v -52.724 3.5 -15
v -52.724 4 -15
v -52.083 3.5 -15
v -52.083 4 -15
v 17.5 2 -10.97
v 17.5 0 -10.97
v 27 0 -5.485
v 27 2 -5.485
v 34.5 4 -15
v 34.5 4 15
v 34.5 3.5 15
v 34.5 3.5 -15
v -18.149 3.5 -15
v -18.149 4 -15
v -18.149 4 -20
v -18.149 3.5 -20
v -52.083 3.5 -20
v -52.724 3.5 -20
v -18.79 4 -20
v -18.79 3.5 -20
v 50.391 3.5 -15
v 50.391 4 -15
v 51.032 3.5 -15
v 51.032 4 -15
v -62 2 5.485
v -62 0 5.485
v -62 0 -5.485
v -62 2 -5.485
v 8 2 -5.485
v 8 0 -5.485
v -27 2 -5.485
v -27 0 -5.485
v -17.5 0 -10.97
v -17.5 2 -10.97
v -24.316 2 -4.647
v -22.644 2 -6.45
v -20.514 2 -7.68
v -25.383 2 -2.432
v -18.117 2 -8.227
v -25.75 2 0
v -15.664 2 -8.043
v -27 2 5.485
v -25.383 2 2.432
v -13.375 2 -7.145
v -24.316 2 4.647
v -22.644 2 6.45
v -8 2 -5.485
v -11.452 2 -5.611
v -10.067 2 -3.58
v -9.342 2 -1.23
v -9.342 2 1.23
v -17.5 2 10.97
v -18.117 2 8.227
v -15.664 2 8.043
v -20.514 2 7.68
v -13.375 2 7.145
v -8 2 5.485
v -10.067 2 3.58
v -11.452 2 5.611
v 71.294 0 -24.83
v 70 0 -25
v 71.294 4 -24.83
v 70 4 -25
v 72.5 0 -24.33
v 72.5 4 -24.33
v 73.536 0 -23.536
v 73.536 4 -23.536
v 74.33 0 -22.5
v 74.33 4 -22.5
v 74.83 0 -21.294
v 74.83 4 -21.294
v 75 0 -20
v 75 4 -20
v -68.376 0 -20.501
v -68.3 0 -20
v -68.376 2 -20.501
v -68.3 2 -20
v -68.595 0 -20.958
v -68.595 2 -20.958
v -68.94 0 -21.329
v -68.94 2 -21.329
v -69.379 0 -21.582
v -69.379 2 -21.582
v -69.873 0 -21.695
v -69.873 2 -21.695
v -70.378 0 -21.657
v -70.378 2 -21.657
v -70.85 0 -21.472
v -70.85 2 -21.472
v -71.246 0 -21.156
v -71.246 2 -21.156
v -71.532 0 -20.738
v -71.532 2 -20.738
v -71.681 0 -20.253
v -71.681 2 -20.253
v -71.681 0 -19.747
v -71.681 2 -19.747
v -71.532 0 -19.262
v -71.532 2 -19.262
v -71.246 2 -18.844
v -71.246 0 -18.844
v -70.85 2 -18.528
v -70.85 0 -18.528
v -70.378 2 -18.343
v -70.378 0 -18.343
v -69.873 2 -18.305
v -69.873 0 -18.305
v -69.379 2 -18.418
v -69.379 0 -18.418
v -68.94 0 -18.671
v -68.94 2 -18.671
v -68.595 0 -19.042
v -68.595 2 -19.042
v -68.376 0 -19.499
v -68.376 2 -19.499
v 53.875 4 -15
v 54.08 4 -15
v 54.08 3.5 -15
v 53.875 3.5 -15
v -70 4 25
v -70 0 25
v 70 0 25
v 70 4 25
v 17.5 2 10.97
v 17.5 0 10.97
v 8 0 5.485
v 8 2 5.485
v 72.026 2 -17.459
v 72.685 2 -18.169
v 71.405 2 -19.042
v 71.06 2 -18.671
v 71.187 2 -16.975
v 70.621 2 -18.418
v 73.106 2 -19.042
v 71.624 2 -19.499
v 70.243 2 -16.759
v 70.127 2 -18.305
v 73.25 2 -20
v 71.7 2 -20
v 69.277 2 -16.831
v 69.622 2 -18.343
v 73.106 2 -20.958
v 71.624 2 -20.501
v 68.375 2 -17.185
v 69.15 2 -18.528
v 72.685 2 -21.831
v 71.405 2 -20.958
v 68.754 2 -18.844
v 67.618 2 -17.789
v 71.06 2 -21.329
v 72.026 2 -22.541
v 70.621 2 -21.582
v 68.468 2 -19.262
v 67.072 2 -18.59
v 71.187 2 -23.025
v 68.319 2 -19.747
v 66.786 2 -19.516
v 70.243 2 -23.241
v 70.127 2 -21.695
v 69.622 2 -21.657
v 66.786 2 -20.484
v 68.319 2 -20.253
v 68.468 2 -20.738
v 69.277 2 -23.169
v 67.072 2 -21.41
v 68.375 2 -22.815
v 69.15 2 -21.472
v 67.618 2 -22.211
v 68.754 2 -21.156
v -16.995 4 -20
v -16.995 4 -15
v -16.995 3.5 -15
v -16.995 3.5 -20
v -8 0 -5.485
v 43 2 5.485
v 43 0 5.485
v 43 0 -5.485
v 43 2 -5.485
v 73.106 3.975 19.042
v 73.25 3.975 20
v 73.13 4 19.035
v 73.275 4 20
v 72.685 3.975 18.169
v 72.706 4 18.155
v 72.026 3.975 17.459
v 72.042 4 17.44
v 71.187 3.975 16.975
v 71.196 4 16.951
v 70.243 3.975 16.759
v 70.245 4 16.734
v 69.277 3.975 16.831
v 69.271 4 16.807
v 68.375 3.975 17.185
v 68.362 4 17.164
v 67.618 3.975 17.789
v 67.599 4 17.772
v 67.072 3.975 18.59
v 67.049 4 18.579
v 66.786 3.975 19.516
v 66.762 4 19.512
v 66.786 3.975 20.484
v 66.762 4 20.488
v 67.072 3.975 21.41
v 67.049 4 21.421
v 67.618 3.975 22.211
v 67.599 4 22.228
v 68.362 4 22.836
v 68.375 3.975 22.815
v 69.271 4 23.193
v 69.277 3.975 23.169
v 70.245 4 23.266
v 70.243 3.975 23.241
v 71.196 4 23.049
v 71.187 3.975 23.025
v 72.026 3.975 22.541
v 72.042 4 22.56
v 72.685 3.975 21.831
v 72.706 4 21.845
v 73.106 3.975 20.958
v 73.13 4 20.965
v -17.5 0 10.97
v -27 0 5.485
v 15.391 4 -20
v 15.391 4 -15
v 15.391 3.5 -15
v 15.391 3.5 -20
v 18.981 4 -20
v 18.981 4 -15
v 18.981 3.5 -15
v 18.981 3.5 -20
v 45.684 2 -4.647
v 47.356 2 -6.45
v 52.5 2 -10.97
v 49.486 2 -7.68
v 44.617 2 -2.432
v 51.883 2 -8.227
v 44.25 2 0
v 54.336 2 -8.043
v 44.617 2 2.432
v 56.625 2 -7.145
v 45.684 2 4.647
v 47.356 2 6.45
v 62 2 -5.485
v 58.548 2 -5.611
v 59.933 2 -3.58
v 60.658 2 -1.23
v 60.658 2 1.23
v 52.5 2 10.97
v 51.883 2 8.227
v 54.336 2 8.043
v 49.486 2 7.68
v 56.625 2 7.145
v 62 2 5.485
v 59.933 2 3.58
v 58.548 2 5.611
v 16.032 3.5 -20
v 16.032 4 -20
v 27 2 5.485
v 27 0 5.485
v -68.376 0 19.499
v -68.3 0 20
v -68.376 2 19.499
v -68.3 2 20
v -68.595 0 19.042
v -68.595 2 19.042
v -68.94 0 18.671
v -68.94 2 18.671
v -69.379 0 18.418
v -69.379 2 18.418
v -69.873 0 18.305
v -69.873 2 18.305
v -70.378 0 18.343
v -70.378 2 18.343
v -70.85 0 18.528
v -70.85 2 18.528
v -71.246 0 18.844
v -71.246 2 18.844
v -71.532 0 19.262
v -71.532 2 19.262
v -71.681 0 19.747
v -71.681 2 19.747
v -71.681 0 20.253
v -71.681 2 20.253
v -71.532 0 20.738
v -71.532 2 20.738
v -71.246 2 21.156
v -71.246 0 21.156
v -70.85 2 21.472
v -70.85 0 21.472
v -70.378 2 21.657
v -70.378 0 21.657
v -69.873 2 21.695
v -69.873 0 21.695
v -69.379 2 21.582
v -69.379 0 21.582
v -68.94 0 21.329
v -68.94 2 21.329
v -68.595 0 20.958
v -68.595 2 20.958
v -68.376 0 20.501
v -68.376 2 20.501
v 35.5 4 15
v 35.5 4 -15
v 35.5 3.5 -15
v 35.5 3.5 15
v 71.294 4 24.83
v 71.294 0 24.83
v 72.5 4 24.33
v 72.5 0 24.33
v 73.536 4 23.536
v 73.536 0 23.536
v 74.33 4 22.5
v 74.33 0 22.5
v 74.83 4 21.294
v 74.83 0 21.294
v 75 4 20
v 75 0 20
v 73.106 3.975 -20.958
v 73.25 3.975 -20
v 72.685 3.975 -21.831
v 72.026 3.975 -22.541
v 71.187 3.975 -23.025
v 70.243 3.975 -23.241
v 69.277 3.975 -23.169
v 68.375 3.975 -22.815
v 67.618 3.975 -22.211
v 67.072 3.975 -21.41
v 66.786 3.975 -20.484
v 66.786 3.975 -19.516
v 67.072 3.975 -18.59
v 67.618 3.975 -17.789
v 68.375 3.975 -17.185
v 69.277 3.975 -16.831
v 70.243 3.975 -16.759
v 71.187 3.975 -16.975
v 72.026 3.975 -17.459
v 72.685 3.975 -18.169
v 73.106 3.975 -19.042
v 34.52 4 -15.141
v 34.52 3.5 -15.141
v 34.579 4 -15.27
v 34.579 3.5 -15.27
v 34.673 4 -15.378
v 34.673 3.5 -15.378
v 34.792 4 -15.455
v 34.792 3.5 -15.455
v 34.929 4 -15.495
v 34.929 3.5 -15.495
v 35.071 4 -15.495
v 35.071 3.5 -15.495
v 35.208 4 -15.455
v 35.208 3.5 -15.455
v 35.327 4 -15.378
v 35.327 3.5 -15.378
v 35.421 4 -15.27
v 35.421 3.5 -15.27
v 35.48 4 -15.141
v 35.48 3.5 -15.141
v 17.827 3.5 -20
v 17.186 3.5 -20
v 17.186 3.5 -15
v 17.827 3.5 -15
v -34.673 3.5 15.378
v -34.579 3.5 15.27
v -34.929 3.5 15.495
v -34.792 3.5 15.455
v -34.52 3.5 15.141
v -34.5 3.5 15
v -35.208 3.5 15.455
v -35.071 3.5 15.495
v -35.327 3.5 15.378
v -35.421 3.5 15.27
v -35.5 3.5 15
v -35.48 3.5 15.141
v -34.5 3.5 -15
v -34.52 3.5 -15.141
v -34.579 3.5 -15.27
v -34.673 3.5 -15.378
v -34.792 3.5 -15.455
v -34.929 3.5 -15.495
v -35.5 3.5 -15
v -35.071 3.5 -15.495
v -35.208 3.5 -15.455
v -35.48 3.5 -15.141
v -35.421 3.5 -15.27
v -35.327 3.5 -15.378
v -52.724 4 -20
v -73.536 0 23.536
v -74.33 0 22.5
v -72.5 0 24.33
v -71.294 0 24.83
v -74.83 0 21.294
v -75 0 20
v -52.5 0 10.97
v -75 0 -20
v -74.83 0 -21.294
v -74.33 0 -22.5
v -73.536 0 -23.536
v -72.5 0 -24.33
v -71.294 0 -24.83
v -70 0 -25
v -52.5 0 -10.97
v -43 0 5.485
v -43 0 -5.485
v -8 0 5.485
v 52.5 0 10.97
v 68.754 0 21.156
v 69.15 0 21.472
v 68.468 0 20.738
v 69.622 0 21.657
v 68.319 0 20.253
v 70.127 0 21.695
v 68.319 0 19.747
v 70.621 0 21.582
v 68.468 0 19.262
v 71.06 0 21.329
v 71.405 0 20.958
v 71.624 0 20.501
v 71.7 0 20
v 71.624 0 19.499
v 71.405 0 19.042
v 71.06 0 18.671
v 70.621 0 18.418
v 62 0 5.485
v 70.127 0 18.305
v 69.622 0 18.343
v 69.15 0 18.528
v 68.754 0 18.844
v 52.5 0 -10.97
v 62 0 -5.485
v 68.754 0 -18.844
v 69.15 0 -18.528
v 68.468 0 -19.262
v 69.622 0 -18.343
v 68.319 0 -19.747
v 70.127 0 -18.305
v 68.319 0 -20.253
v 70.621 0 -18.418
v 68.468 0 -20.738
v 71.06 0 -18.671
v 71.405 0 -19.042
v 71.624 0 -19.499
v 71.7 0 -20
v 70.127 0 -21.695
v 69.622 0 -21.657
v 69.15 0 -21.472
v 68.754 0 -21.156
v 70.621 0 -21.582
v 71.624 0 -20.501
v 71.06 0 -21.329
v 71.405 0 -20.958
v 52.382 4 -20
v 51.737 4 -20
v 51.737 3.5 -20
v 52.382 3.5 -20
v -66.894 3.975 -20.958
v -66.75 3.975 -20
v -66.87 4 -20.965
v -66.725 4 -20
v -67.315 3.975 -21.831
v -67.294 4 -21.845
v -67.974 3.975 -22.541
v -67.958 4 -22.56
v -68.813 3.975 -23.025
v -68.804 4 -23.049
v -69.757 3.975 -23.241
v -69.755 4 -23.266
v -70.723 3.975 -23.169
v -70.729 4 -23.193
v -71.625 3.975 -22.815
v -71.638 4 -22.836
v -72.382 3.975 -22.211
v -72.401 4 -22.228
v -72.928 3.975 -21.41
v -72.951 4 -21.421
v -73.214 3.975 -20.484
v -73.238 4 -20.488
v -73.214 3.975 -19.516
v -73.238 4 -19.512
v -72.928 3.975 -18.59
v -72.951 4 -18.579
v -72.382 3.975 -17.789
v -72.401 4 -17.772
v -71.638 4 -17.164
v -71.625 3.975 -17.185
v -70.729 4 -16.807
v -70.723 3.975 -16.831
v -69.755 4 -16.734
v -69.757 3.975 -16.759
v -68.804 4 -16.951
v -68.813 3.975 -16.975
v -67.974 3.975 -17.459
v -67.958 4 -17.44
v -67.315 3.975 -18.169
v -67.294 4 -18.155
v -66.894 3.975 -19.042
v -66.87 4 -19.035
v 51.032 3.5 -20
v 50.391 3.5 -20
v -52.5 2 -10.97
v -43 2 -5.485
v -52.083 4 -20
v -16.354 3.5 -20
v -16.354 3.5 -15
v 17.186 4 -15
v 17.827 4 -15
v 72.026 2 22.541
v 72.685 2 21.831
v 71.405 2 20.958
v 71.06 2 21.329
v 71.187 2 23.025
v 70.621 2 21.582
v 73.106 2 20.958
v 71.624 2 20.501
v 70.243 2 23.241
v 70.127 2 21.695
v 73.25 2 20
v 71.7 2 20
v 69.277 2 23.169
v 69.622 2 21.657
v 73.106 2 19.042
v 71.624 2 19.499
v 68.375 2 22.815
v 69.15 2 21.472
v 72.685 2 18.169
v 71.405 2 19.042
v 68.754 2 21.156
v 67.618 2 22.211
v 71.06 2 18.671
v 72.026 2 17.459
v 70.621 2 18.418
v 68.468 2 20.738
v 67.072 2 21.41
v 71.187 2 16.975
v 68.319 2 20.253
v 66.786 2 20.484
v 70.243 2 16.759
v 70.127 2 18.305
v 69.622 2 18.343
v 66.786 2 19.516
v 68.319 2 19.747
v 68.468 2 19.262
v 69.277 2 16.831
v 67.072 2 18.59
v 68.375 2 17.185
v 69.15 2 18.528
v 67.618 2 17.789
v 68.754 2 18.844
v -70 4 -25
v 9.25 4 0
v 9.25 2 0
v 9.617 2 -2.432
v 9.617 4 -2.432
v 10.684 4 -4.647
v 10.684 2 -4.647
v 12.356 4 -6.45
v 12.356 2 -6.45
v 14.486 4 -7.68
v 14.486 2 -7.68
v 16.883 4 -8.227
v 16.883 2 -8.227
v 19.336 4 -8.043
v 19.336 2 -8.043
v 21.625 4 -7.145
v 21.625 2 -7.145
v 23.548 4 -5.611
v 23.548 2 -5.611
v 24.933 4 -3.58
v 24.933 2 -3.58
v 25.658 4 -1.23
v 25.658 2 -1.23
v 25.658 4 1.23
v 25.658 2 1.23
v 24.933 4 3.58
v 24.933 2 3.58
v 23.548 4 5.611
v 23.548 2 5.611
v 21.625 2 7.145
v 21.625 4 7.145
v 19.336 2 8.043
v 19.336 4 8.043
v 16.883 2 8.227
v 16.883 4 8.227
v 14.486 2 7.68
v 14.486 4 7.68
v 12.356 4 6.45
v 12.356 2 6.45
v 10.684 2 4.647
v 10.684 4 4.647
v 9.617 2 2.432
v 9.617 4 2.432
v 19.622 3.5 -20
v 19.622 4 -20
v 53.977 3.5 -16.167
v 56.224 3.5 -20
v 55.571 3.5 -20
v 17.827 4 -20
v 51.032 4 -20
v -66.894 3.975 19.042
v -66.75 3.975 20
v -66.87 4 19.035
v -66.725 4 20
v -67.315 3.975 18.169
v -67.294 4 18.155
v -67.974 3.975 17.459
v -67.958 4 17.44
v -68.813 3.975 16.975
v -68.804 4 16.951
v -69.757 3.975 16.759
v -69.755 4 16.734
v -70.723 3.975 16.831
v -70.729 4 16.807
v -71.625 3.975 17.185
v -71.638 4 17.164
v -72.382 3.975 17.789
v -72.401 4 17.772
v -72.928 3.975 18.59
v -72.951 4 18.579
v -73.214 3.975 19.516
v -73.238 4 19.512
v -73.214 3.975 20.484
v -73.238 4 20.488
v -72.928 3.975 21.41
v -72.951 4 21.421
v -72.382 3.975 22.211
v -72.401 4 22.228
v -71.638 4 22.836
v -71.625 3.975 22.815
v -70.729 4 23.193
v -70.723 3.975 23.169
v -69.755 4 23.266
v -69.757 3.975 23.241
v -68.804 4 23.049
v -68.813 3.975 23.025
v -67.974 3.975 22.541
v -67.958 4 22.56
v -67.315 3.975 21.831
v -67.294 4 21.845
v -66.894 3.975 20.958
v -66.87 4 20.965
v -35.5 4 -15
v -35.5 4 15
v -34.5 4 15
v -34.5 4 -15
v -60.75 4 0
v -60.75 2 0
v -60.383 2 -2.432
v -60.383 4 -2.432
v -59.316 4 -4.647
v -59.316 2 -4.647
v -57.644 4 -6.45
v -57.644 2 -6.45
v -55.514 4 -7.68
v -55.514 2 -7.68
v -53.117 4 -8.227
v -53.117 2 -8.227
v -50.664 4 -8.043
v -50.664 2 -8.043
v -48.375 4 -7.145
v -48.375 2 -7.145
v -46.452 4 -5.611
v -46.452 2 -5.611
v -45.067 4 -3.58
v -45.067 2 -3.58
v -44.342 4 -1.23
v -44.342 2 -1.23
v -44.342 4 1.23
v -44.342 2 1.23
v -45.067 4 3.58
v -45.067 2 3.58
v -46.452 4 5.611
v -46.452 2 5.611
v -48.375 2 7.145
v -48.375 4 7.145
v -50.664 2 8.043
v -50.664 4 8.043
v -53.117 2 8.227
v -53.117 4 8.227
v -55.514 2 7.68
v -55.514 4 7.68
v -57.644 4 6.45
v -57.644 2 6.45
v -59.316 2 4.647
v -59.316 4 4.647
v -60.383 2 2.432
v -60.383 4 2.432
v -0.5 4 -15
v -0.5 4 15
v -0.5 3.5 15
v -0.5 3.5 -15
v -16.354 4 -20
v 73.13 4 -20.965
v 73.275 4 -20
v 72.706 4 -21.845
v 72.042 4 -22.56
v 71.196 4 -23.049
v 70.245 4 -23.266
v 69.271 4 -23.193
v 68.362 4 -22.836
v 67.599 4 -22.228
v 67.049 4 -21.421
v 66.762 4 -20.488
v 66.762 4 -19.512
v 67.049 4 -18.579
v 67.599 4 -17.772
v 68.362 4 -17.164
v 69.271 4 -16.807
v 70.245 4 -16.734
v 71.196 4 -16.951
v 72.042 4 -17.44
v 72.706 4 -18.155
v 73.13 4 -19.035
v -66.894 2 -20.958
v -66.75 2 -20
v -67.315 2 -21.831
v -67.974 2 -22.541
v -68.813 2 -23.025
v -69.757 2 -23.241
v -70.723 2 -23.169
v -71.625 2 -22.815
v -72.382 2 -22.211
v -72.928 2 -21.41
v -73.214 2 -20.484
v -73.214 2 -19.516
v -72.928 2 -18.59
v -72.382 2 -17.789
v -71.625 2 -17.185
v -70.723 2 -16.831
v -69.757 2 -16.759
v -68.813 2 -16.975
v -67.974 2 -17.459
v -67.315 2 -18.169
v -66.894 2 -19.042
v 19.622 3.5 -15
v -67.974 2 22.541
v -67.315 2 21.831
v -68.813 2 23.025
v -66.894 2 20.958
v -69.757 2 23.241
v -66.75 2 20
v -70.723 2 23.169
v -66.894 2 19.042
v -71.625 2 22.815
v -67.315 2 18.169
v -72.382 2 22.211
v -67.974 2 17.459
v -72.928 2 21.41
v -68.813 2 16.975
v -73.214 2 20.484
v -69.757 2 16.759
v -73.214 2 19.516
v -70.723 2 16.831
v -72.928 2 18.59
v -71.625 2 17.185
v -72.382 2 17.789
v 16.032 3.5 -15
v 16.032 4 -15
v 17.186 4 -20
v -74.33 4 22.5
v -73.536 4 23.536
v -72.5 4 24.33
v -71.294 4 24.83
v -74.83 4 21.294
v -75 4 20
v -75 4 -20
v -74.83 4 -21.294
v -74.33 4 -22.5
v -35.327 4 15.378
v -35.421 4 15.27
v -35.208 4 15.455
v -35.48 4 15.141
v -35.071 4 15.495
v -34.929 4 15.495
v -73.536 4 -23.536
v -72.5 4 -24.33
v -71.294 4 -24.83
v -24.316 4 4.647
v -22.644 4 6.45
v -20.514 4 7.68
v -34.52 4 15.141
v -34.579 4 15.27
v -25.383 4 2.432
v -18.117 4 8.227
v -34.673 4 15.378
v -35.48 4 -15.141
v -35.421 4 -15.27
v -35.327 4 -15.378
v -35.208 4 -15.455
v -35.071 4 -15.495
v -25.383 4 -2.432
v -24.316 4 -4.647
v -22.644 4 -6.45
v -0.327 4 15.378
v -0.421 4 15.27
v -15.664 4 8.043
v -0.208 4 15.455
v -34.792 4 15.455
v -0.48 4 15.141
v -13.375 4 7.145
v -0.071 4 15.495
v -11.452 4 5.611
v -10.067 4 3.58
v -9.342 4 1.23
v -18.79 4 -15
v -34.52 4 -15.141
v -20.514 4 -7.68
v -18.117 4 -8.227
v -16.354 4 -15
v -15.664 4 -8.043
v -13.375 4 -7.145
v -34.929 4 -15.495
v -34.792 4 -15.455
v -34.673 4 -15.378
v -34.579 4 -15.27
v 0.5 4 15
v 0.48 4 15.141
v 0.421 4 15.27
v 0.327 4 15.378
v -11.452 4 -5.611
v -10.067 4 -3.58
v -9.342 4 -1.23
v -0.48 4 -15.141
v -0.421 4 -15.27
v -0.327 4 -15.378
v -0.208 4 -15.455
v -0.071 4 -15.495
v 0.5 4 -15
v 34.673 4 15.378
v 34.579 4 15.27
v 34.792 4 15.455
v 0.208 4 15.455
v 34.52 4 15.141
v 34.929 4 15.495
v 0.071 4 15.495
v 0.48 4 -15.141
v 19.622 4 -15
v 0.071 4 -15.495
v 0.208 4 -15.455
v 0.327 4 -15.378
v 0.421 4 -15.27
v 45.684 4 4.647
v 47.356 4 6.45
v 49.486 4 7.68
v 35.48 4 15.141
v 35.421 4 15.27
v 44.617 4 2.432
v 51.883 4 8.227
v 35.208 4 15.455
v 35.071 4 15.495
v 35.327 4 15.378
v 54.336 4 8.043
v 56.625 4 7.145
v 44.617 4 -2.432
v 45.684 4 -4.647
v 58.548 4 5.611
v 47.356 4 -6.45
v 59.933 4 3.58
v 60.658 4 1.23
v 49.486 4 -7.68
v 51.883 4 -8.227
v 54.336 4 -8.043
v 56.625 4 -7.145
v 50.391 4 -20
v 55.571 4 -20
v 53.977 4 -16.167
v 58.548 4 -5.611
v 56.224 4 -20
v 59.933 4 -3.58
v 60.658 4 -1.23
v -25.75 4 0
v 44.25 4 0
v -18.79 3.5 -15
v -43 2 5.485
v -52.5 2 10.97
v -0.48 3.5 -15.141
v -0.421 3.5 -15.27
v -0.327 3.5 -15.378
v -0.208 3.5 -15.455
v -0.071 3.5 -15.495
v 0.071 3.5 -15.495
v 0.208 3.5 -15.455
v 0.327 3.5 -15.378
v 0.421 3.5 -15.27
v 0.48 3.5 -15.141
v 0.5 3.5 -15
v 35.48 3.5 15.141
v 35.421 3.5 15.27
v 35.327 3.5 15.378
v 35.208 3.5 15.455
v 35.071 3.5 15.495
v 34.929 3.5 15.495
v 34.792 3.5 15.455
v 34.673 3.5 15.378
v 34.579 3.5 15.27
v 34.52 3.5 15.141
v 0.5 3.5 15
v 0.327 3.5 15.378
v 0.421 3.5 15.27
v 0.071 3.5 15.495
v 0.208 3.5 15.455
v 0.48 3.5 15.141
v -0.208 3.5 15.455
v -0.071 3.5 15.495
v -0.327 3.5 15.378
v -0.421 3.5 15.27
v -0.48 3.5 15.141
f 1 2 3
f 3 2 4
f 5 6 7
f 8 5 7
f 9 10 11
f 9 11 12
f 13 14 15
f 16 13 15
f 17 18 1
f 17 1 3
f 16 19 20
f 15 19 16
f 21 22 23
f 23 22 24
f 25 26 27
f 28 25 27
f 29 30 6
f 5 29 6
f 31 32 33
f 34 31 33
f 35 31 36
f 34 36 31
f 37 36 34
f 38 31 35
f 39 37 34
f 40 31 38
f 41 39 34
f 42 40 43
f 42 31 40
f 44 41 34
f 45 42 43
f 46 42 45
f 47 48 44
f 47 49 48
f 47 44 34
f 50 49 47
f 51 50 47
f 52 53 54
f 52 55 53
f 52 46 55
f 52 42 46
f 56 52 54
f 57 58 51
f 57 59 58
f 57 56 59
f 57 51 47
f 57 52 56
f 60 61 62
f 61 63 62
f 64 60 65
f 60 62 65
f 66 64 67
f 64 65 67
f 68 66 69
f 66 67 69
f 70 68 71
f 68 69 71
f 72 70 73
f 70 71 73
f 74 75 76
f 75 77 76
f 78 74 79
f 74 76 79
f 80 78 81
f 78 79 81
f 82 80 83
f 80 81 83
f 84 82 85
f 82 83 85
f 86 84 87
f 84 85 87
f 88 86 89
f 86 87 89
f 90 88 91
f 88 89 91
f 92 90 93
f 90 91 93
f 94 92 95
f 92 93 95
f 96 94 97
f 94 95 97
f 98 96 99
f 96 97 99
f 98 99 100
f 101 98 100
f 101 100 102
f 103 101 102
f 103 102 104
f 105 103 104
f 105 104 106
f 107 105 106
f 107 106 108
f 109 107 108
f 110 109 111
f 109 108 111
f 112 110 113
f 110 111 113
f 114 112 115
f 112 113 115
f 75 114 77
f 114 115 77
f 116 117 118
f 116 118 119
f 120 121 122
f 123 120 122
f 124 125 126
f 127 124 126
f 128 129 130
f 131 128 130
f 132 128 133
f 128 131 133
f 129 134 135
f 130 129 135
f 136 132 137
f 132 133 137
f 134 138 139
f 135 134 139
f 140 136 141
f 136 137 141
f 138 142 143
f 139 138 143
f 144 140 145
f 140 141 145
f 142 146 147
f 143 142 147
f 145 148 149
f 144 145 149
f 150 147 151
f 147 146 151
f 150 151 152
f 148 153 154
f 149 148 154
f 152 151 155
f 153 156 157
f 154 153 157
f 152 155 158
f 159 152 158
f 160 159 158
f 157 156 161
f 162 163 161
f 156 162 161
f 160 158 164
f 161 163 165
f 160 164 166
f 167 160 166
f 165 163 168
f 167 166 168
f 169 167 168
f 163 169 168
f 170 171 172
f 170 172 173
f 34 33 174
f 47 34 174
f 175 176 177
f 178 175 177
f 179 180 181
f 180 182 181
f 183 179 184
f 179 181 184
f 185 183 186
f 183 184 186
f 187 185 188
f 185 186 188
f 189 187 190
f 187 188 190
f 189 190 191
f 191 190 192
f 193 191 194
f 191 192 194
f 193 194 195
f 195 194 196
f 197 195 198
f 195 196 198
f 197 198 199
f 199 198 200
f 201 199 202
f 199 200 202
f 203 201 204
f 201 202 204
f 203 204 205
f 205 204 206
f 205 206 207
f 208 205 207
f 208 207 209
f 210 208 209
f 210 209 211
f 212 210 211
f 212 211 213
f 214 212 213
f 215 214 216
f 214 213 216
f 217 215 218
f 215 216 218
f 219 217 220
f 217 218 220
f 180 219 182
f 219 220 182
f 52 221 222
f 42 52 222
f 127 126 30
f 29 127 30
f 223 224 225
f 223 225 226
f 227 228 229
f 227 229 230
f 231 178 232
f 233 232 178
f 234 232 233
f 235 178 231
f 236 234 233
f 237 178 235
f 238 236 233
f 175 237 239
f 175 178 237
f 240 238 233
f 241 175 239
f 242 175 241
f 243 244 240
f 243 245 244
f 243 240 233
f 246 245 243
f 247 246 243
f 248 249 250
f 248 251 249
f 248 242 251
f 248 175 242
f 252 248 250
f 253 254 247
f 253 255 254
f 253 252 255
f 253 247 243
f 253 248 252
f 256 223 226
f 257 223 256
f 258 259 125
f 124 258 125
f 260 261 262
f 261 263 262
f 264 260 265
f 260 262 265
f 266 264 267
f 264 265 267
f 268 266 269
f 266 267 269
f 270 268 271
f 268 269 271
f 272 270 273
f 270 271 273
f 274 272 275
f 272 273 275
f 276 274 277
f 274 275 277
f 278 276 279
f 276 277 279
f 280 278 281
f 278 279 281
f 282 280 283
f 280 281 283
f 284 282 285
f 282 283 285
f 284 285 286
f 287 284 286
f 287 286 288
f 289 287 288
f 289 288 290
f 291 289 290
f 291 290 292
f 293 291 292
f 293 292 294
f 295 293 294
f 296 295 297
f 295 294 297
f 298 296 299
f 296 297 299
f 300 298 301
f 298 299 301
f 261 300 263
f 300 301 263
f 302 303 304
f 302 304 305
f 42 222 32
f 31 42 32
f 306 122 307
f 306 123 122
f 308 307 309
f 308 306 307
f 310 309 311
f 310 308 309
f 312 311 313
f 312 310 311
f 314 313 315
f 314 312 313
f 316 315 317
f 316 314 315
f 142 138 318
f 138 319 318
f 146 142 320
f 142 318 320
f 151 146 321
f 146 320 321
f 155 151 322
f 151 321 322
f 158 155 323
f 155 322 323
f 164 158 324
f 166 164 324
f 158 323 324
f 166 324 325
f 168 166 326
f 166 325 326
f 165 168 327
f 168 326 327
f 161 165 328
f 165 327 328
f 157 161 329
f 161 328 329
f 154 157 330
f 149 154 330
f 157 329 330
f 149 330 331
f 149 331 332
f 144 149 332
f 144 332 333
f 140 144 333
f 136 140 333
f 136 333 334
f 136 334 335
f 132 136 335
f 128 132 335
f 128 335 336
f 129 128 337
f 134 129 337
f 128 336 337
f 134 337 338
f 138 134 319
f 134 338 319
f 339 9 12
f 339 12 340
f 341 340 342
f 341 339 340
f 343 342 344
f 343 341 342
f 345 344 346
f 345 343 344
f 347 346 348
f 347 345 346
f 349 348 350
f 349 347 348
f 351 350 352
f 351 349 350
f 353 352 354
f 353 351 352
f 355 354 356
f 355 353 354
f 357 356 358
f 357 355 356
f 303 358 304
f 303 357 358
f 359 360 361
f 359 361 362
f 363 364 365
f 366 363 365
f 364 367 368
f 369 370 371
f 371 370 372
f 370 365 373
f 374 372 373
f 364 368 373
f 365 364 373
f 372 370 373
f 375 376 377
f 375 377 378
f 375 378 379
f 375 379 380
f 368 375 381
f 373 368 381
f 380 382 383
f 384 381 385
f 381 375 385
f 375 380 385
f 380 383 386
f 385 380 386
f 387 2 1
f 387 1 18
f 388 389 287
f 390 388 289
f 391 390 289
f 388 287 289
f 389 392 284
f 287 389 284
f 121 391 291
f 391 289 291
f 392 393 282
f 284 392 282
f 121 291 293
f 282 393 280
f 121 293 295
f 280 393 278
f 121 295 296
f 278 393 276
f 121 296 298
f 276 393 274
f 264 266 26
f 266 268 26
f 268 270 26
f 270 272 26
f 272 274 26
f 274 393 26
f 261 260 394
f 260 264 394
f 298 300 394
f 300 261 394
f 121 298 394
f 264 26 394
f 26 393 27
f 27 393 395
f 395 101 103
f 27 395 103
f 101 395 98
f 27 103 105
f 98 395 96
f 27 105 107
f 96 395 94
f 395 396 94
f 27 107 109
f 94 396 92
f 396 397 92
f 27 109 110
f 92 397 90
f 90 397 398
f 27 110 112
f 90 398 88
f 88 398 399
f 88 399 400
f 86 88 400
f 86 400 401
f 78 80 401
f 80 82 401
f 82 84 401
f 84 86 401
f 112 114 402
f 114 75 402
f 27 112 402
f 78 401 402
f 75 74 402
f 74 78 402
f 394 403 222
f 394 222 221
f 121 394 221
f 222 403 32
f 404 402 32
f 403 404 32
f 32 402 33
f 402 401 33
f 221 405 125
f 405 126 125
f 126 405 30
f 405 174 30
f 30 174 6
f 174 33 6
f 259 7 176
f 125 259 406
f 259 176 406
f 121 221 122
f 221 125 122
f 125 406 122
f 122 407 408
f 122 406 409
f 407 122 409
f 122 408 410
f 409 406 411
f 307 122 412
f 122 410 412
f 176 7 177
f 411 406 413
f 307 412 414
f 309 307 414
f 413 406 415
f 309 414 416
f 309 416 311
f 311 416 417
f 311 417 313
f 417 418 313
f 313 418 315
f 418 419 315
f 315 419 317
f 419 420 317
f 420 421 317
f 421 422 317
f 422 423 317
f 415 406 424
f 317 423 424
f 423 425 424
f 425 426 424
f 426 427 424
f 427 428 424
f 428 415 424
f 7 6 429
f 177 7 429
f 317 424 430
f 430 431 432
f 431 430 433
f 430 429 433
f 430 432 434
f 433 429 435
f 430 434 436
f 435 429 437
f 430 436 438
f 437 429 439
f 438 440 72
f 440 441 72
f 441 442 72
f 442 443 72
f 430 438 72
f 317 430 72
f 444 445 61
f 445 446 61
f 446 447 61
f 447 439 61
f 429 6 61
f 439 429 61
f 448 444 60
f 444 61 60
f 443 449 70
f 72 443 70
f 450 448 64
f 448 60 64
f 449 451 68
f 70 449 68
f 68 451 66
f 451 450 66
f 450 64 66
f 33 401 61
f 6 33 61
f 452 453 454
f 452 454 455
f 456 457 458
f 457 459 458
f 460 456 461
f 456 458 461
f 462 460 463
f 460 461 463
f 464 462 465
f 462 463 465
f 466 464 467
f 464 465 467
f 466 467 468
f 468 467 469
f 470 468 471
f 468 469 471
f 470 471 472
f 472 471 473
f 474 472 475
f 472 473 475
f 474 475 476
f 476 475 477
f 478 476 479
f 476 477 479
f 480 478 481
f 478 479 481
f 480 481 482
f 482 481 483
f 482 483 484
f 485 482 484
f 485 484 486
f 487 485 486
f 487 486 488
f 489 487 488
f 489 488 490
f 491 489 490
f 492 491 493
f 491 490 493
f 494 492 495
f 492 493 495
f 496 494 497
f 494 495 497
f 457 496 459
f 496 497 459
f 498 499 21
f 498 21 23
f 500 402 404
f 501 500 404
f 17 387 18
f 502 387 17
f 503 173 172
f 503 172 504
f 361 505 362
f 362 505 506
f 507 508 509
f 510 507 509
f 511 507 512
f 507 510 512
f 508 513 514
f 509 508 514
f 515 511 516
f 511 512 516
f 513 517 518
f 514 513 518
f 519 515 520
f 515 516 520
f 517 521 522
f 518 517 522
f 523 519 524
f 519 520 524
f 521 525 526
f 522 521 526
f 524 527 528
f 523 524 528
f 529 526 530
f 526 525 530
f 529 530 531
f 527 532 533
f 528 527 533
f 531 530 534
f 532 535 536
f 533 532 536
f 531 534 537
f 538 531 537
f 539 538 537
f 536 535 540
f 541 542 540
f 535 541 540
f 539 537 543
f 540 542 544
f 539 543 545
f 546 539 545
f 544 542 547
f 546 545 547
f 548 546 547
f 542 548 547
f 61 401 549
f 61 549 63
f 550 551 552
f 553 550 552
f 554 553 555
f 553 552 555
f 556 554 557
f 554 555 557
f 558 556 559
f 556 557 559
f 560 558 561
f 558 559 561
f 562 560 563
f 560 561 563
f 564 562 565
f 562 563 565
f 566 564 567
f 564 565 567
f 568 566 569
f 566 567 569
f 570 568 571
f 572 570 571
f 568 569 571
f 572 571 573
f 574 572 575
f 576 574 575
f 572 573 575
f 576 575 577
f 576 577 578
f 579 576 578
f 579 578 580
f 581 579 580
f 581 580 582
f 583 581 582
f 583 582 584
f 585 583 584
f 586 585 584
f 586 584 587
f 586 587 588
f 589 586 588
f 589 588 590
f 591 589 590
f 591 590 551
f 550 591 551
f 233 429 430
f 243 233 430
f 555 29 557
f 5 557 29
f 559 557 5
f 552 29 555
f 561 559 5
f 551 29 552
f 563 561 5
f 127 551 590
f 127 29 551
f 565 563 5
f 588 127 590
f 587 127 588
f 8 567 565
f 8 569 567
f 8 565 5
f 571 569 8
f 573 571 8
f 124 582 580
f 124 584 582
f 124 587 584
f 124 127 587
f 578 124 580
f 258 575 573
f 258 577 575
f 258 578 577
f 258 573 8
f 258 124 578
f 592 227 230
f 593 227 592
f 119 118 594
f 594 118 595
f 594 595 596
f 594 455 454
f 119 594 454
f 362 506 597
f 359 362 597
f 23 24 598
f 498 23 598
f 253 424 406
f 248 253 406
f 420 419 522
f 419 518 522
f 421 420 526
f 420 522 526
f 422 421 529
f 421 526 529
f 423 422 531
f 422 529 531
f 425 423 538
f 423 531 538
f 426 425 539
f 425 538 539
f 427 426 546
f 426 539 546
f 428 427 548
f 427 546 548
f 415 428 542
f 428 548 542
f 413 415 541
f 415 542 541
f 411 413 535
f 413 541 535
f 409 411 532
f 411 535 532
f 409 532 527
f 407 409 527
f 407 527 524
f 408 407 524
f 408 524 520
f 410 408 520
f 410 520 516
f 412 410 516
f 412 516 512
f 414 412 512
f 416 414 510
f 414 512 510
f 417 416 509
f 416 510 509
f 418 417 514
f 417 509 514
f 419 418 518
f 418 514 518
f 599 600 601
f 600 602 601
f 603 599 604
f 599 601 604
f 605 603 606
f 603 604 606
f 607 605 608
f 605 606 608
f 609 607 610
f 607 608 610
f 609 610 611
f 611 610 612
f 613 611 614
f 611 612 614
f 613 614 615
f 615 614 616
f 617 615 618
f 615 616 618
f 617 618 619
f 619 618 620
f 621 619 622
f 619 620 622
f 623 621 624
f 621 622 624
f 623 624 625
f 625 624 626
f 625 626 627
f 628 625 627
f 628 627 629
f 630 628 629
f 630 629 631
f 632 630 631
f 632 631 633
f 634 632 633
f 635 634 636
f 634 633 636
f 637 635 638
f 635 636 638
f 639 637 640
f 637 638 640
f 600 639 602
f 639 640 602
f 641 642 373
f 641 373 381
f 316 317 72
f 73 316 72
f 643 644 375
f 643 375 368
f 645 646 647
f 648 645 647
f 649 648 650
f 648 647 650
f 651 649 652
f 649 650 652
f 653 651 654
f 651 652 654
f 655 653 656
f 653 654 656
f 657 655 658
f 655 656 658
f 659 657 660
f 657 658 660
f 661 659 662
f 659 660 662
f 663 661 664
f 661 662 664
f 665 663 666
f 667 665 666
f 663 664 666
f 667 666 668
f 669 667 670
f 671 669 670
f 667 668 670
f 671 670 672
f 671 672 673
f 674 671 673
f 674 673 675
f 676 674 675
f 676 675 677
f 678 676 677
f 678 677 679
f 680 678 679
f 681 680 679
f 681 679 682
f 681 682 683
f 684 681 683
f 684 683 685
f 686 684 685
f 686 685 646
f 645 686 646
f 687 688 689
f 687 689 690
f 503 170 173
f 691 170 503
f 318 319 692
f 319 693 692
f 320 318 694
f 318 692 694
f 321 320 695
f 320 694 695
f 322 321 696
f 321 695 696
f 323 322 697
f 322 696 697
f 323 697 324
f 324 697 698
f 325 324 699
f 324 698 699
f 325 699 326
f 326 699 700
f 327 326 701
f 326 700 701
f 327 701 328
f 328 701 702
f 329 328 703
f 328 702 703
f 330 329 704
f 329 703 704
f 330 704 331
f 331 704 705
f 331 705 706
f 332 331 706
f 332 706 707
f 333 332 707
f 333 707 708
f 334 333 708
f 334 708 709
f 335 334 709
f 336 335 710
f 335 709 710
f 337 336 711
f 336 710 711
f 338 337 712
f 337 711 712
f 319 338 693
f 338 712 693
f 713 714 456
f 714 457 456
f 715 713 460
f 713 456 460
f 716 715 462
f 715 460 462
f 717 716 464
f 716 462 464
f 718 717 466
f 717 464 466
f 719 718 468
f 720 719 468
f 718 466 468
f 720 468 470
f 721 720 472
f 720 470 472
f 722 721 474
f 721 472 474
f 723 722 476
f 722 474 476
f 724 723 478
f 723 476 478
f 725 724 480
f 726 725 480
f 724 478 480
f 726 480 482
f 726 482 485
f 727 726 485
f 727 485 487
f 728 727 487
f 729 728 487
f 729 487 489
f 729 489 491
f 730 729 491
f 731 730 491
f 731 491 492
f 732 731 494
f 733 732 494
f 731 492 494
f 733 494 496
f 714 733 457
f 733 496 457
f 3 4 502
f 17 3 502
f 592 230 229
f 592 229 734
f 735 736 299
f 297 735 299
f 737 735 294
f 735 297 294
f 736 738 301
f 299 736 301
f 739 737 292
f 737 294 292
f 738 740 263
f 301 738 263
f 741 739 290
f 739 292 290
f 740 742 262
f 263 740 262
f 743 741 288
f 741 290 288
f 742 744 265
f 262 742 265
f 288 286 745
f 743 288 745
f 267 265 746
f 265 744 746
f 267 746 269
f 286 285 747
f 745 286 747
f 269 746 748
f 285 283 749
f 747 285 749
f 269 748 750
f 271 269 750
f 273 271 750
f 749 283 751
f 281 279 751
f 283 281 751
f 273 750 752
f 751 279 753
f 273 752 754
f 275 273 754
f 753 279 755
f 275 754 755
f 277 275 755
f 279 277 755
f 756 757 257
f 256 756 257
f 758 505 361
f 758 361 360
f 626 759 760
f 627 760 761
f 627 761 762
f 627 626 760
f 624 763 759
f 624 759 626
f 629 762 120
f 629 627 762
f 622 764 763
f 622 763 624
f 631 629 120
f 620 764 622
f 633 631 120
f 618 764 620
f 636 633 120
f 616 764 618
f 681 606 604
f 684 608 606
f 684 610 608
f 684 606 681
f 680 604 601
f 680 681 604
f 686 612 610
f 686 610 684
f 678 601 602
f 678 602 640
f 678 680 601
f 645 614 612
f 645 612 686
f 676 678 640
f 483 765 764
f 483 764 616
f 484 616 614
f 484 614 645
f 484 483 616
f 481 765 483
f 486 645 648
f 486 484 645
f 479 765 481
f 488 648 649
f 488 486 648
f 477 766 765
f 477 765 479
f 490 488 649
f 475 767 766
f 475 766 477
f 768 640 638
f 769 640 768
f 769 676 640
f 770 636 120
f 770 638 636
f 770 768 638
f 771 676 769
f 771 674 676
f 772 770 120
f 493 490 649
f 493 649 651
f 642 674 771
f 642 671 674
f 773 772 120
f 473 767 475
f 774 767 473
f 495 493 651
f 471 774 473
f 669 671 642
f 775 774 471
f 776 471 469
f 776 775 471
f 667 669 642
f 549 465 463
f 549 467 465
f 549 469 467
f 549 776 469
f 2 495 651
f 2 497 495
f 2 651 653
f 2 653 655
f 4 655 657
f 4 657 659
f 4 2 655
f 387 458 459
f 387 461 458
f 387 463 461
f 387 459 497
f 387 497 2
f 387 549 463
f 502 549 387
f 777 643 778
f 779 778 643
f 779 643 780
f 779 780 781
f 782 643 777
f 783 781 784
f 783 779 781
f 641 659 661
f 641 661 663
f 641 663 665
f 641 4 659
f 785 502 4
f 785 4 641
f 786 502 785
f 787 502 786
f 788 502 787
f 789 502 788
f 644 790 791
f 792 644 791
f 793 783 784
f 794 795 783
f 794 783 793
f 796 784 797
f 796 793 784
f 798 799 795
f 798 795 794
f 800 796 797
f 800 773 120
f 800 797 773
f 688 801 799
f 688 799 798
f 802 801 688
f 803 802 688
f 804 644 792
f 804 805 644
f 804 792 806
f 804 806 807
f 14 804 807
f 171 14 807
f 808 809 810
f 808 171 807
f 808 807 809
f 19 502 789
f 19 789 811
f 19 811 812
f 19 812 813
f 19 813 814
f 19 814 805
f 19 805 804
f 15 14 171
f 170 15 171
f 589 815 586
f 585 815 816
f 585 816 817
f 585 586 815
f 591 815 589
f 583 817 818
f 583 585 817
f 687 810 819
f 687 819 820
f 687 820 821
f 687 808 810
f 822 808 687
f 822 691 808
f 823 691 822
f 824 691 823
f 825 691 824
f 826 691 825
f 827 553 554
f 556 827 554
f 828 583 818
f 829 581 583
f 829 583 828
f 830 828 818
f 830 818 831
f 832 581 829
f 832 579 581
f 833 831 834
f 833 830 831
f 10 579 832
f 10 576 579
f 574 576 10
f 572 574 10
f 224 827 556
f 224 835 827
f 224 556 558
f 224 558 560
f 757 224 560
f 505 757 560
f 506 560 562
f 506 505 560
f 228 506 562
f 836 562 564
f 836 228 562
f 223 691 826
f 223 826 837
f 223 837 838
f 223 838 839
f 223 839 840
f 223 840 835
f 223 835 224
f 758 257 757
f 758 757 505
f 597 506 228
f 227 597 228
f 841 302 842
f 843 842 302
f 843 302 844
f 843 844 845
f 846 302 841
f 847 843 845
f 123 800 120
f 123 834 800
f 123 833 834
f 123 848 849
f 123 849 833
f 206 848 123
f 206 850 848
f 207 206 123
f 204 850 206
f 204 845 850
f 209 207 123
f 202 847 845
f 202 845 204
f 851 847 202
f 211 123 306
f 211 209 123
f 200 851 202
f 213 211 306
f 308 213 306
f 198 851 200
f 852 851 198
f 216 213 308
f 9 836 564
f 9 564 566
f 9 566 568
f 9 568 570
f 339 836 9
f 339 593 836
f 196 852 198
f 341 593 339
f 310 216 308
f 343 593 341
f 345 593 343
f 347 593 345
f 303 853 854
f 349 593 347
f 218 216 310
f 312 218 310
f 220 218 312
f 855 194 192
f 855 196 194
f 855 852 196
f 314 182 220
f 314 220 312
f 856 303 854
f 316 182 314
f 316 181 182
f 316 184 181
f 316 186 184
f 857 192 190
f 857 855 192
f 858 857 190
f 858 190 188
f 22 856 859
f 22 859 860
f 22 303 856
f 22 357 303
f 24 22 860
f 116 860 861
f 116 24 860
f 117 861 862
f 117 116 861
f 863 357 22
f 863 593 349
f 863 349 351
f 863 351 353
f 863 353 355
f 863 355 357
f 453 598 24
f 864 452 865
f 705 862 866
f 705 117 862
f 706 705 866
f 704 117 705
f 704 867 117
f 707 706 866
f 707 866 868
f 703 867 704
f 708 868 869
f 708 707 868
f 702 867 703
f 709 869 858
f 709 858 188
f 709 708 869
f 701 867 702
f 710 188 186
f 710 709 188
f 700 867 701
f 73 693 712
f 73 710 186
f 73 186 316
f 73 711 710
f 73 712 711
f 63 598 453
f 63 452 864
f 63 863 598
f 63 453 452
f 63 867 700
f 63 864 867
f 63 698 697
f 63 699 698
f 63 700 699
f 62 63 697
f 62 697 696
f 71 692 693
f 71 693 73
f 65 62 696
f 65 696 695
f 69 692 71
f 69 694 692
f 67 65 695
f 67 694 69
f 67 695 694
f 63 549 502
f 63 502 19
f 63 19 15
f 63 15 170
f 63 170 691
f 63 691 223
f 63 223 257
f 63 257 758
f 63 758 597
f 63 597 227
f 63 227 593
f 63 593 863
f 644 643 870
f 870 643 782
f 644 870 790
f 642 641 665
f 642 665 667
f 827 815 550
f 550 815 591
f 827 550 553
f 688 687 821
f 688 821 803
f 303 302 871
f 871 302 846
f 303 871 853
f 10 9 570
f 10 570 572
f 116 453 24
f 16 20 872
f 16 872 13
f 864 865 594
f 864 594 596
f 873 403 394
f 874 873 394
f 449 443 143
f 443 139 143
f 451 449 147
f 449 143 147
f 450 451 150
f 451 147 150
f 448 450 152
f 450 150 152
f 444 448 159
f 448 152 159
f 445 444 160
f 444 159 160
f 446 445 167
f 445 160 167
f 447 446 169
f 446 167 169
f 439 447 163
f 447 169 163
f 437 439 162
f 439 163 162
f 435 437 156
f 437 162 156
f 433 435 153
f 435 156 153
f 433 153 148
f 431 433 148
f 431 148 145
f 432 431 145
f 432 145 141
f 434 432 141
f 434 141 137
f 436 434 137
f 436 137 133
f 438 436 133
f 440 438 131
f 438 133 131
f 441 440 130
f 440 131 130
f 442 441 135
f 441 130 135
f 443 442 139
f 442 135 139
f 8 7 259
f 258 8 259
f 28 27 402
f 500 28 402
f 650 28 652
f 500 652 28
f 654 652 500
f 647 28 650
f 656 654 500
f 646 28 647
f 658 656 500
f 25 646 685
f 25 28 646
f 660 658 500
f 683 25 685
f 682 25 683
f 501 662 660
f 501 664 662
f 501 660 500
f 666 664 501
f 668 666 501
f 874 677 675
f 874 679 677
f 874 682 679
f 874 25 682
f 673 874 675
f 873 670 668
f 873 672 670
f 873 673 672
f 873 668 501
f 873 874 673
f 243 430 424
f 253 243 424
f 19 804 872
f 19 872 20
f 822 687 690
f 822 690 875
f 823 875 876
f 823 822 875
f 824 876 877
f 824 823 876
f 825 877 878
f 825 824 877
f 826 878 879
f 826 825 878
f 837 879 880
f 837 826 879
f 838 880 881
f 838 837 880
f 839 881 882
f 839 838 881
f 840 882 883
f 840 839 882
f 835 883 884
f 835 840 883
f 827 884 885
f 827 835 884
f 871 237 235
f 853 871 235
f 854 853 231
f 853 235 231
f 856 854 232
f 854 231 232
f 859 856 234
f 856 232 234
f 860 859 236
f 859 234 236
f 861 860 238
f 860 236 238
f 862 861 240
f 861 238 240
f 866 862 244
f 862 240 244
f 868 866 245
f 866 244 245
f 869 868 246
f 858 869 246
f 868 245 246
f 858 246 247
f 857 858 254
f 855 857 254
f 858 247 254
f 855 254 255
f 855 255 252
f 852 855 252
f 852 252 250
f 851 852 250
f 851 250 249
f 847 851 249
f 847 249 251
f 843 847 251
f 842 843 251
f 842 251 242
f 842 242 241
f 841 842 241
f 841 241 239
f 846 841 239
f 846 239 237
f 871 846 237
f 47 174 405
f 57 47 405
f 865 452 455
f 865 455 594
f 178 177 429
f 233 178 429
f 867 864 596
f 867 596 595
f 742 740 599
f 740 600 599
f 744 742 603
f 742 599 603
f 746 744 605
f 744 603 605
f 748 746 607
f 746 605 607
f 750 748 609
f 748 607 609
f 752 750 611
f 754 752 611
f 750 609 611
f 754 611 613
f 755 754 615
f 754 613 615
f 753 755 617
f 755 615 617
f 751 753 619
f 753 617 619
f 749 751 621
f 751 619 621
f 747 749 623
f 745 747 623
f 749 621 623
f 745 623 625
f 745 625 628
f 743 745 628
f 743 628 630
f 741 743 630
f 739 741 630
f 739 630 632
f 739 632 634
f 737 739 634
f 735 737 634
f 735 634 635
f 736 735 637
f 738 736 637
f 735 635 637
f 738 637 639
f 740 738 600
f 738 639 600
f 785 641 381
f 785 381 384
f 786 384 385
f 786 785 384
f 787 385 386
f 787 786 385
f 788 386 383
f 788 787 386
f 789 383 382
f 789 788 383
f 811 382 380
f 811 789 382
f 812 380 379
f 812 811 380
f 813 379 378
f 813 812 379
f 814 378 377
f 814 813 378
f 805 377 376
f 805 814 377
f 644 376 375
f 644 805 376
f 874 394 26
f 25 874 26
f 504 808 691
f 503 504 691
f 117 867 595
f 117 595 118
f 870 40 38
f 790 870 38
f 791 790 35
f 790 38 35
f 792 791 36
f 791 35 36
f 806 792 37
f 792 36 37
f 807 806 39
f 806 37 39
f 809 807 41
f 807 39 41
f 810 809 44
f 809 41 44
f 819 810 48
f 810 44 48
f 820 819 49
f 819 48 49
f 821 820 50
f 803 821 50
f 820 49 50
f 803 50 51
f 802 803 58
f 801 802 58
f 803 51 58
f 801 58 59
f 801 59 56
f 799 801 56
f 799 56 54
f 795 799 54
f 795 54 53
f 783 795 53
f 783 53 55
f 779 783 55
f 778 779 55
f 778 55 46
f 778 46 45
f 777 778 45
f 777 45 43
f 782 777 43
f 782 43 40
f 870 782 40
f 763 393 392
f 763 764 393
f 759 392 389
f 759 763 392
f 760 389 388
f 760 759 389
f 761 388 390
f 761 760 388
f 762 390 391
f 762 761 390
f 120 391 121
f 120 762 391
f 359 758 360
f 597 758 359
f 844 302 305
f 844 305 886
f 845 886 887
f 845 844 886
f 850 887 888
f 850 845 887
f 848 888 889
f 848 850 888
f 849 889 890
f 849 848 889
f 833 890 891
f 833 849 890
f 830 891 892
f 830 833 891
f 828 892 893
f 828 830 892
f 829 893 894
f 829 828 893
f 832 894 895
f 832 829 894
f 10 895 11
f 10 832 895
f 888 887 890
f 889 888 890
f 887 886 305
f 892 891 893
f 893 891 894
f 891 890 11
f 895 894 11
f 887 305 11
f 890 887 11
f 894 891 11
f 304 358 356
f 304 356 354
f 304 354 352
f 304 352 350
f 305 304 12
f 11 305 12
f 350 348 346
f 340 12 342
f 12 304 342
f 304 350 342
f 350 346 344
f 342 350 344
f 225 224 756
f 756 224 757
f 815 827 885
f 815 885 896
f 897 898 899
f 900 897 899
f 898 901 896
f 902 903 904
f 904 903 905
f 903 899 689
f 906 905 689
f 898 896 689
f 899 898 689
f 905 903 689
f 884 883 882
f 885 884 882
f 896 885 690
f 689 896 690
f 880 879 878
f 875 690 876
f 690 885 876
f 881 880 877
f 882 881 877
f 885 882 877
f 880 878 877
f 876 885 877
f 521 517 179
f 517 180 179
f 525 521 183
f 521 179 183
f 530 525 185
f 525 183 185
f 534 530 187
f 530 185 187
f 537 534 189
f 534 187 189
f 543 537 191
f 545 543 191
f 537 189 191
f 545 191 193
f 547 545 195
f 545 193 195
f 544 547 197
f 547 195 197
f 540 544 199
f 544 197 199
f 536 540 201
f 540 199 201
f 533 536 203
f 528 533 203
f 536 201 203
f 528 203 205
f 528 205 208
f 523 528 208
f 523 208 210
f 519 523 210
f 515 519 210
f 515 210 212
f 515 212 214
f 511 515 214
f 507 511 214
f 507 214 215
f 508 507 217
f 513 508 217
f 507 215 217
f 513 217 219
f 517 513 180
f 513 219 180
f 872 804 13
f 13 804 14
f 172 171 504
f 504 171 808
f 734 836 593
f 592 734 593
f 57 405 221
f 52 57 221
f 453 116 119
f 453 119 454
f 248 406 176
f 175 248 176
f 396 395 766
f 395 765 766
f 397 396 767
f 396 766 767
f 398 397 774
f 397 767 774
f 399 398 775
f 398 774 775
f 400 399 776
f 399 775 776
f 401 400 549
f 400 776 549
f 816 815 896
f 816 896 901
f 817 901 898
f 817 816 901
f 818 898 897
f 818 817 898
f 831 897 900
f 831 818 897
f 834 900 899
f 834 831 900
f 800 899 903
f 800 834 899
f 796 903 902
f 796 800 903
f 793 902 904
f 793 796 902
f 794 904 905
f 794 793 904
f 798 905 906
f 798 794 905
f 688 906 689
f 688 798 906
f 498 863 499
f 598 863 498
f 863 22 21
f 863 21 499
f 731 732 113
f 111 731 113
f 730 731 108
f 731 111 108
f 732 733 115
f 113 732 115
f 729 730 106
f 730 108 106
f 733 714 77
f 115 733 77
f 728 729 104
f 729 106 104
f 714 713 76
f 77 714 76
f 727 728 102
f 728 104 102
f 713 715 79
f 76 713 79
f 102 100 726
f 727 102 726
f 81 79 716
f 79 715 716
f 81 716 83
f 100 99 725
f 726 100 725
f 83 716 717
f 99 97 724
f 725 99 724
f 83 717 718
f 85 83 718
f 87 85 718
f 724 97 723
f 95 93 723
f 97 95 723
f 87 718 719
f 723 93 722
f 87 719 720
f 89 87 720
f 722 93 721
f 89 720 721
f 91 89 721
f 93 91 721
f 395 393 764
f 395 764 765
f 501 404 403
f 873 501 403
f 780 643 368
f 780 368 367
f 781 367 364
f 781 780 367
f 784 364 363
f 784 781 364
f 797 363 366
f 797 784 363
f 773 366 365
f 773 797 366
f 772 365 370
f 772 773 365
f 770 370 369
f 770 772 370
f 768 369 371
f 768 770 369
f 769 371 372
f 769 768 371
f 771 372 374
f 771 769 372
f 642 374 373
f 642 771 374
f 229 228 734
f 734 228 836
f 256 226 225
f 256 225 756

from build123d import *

# Parameters (mm, degrees)
SKETCH1_W              = 150
SKETCH1_H              = 50
BODY_DEPTH             = 4
EDGE_FILLETS_R         = 5
GX16_HOLE_D            = 16.5
GX16_NUT_CUTOUT_DEPTH  = 2
GX16_PATTERN_COUNT     = 4
GX16_PATTERN_PITCH     = 35
DESIGN_CUTOUT_SKETCH_W = 0.641025641
DESIGN_CUTOUT_SKETCH_H = 5
DESIGN_CUTOUT_DEPTH    = 0.5


# Read off the part's stored shape, not the designer's step: mounting_holes
with BuildPart() as part:
    # Sketch1 → body (new body)
    with BuildSketch(Plane(origin=(0, 0, 0), x_dir=(1, 0, 0), z_dir=(0, 1, 0))):
        Rectangle(SKETCH1_W, SKETCH1_H)
    extrude(amount=BODY_DEPTH)

    # mounting_holes outline → mounting_holes (revolve, cut)
    with BuildSketch(Plane(origin=(70, 0, 20), x_dir=(1, 0, 0), z_dir=(0, 0, 1))):
        Polygon((0, 0), (1.7, 0), (1.7, 2), (3.25, 2), (3.25, 3.975), (3.275, 4), (0, 4), align=None)
    revolve(axis=Axis((70, 0, 20), (0, 1, 0)), mode=Mode.SUBTRACT)

    # mounting_holes 2 outline → mounting_holes 2 (revolve, cut)
    with BuildSketch(Plane(origin=(-70, 0, -20), x_dir=(1, 0, 0), z_dir=(0, 0, 1))):
        Polygon((0, 4), (0, 0), (1.7, 0), (1.7, 2), (3.25, 2), (3.25, 3.975), (3.275, 4), align=None)
    revolve(axis=Axis((-70, 0, -20), (0, 1, 0)), mode=Mode.SUBTRACT)

    # mounting_holes 3 outline → mounting_holes 3 (revolve, cut)
    with BuildSketch(Plane(origin=(70, 0, -20), x_dir=(1, 0, 0), z_dir=(0, 0, 1))):
        Polygon((0, 4), (0, 0), (1.7, 0), (1.7, 2), (3.25, 2), (3.25, 3.975), (3.275, 4), align=None)
    revolve(axis=Axis((70, 0, -20), (0, 1, 0)), mode=Mode.SUBTRACT)

    # mounting_holes 4 outline → mounting_holes 4 (revolve, cut)
    with BuildSketch(Plane(origin=(-70, 0, 20), x_dir=(1, 0, 0), z_dir=(0, 0, 1))):
        Polygon((0, 4), (0, 0), (1.7, 0), (1.7, 2), (3.25, 2), (3.25, 3.975), (3.275, 4), align=None)
    revolve(axis=Axis((-70, 0, 20), (0, 1, 0)), mode=Mode.SUBTRACT)

    # edge_fillets
    edge_fillets_edges = [part.edges().sort_by_distance(p)[0] for p in [
        (75, 2, 25),
        (-75, 2, 25),
        (-75, 2, -25),
        (75, 2, -25),
    ]]
    fillet(edge_fillets_edges, radius=EDGE_FILLETS_R)

    # gx16_hole (through all)
    with Locations(Plane(origin=(0, 4, 0), x_dir=(1, 0, 0), z_dir=(0, 1, 0))):
        with Locations((-52.5, 0)):
            gx16_hole = Hole(GX16_HOLE_D / 2)

    # Sketch6 → gx16_nut-cutout (cut)
    with BuildSketch(Plane.XZ):
        Polygon((-52.5, 10.969655115), (-62, 5.484827557), (-62, -5.484827557), (-52.5, -10.969655115), (-43, -5.484827557), (-43, 5.484827557), align=None)
    gx16_nut_cutout = extrude(amount=-GX16_NUT_CUTOUT_DEPTH, mode=Mode.SUBTRACT)

    # gx16_pattern: gx16_hole, gx16_nut-cutout ×4
    with Locations(*[(i * GX16_PATTERN_PITCH, 0, 0) for i in range(1, GX16_PATTERN_COUNT)]):
        add(gx16_hole, mode=Mode.SUBTRACT)
        add(gx16_nut_cutout, mode=Mode.SUBTRACT)

    # design_cutout_sketch → design_cutout (cut)
    with BuildSketch(Plane(origin=(0, 4, 0), x_dir=(1, 0, 0), z_dir=(0, 1, 0))):
        with BuildLine():
            Line((-34.5, 15), (-34.5, -15))
            ThreePointArc((-34.5, -15), (-35, -15.5), (-35.5, -15))
            Line((-35.5, -15), (-35.5, 15))
            ThreePointArc((-35.5, 15), (-35, 15.5), (-34.5, 15))
        make_face()
        with BuildLine():
            Line((0.5, 15), (0.5, -15))
            ThreePointArc((0.5, -15), (0, -15.5), (-0.5, -15))
            Line((-0.5, -15), (-0.5, 15))
            ThreePointArc((-0.5, 15), (0, 15.5), (0.5, 15))
        make_face()
        with BuildLine():
            Line((35.5, 15), (35.5, -15))
            ThreePointArc((35.5, -15), (35, -15.5), (34.5, -15))
            Line((34.5, -15), (34.5, 15))
            ThreePointArc((34.5, 15), (35, 15.5), (35.5, 15))
        make_face()
        with Locations((-52.403846154, 17.5)):
            Rectangle(DESIGN_CUTOUT_SKETCH_W, DESIGN_CUTOUT_SKETCH_H)
        with Locations((-18.46923077, 17.5)):
            Rectangle(DESIGN_CUTOUT_SKETCH_W, DESIGN_CUTOUT_SKETCH_H)
        with Locations((-16.674358975, 17.5)):
            Rectangle(DESIGN_CUTOUT_SKETCH_W, DESIGN_CUTOUT_SKETCH_H)
        with Locations((15.711538462, 17.5)):
            Rectangle(DESIGN_CUTOUT_SKETCH_W, DESIGN_CUTOUT_SKETCH_H)
        with Locations((17.506410257, 17.5)):
            Rectangle(DESIGN_CUTOUT_SKETCH_W, DESIGN_CUTOUT_SKETCH_H)
        with Locations((19.301282052, 17.5)):
            Rectangle(DESIGN_CUTOUT_SKETCH_W, DESIGN_CUTOUT_SKETCH_H)
        with Locations((50.711538462, 17.5)):
            Rectangle(DESIGN_CUTOUT_SKETCH_W, DESIGN_CUTOUT_SKETCH_H)
        Polygon((51.737179487, 20), (52.382211538, 20), (53.976762821, 16.166866987), (55.571314103, 20), (56.224358974, 20), (54.079927885, 15), (53.874599359, 15), align=None)
    extrude(amount=-DESIGN_CUTOUT_DEPTH, mode=Mode.SUBTRACT)


solid = part.part
